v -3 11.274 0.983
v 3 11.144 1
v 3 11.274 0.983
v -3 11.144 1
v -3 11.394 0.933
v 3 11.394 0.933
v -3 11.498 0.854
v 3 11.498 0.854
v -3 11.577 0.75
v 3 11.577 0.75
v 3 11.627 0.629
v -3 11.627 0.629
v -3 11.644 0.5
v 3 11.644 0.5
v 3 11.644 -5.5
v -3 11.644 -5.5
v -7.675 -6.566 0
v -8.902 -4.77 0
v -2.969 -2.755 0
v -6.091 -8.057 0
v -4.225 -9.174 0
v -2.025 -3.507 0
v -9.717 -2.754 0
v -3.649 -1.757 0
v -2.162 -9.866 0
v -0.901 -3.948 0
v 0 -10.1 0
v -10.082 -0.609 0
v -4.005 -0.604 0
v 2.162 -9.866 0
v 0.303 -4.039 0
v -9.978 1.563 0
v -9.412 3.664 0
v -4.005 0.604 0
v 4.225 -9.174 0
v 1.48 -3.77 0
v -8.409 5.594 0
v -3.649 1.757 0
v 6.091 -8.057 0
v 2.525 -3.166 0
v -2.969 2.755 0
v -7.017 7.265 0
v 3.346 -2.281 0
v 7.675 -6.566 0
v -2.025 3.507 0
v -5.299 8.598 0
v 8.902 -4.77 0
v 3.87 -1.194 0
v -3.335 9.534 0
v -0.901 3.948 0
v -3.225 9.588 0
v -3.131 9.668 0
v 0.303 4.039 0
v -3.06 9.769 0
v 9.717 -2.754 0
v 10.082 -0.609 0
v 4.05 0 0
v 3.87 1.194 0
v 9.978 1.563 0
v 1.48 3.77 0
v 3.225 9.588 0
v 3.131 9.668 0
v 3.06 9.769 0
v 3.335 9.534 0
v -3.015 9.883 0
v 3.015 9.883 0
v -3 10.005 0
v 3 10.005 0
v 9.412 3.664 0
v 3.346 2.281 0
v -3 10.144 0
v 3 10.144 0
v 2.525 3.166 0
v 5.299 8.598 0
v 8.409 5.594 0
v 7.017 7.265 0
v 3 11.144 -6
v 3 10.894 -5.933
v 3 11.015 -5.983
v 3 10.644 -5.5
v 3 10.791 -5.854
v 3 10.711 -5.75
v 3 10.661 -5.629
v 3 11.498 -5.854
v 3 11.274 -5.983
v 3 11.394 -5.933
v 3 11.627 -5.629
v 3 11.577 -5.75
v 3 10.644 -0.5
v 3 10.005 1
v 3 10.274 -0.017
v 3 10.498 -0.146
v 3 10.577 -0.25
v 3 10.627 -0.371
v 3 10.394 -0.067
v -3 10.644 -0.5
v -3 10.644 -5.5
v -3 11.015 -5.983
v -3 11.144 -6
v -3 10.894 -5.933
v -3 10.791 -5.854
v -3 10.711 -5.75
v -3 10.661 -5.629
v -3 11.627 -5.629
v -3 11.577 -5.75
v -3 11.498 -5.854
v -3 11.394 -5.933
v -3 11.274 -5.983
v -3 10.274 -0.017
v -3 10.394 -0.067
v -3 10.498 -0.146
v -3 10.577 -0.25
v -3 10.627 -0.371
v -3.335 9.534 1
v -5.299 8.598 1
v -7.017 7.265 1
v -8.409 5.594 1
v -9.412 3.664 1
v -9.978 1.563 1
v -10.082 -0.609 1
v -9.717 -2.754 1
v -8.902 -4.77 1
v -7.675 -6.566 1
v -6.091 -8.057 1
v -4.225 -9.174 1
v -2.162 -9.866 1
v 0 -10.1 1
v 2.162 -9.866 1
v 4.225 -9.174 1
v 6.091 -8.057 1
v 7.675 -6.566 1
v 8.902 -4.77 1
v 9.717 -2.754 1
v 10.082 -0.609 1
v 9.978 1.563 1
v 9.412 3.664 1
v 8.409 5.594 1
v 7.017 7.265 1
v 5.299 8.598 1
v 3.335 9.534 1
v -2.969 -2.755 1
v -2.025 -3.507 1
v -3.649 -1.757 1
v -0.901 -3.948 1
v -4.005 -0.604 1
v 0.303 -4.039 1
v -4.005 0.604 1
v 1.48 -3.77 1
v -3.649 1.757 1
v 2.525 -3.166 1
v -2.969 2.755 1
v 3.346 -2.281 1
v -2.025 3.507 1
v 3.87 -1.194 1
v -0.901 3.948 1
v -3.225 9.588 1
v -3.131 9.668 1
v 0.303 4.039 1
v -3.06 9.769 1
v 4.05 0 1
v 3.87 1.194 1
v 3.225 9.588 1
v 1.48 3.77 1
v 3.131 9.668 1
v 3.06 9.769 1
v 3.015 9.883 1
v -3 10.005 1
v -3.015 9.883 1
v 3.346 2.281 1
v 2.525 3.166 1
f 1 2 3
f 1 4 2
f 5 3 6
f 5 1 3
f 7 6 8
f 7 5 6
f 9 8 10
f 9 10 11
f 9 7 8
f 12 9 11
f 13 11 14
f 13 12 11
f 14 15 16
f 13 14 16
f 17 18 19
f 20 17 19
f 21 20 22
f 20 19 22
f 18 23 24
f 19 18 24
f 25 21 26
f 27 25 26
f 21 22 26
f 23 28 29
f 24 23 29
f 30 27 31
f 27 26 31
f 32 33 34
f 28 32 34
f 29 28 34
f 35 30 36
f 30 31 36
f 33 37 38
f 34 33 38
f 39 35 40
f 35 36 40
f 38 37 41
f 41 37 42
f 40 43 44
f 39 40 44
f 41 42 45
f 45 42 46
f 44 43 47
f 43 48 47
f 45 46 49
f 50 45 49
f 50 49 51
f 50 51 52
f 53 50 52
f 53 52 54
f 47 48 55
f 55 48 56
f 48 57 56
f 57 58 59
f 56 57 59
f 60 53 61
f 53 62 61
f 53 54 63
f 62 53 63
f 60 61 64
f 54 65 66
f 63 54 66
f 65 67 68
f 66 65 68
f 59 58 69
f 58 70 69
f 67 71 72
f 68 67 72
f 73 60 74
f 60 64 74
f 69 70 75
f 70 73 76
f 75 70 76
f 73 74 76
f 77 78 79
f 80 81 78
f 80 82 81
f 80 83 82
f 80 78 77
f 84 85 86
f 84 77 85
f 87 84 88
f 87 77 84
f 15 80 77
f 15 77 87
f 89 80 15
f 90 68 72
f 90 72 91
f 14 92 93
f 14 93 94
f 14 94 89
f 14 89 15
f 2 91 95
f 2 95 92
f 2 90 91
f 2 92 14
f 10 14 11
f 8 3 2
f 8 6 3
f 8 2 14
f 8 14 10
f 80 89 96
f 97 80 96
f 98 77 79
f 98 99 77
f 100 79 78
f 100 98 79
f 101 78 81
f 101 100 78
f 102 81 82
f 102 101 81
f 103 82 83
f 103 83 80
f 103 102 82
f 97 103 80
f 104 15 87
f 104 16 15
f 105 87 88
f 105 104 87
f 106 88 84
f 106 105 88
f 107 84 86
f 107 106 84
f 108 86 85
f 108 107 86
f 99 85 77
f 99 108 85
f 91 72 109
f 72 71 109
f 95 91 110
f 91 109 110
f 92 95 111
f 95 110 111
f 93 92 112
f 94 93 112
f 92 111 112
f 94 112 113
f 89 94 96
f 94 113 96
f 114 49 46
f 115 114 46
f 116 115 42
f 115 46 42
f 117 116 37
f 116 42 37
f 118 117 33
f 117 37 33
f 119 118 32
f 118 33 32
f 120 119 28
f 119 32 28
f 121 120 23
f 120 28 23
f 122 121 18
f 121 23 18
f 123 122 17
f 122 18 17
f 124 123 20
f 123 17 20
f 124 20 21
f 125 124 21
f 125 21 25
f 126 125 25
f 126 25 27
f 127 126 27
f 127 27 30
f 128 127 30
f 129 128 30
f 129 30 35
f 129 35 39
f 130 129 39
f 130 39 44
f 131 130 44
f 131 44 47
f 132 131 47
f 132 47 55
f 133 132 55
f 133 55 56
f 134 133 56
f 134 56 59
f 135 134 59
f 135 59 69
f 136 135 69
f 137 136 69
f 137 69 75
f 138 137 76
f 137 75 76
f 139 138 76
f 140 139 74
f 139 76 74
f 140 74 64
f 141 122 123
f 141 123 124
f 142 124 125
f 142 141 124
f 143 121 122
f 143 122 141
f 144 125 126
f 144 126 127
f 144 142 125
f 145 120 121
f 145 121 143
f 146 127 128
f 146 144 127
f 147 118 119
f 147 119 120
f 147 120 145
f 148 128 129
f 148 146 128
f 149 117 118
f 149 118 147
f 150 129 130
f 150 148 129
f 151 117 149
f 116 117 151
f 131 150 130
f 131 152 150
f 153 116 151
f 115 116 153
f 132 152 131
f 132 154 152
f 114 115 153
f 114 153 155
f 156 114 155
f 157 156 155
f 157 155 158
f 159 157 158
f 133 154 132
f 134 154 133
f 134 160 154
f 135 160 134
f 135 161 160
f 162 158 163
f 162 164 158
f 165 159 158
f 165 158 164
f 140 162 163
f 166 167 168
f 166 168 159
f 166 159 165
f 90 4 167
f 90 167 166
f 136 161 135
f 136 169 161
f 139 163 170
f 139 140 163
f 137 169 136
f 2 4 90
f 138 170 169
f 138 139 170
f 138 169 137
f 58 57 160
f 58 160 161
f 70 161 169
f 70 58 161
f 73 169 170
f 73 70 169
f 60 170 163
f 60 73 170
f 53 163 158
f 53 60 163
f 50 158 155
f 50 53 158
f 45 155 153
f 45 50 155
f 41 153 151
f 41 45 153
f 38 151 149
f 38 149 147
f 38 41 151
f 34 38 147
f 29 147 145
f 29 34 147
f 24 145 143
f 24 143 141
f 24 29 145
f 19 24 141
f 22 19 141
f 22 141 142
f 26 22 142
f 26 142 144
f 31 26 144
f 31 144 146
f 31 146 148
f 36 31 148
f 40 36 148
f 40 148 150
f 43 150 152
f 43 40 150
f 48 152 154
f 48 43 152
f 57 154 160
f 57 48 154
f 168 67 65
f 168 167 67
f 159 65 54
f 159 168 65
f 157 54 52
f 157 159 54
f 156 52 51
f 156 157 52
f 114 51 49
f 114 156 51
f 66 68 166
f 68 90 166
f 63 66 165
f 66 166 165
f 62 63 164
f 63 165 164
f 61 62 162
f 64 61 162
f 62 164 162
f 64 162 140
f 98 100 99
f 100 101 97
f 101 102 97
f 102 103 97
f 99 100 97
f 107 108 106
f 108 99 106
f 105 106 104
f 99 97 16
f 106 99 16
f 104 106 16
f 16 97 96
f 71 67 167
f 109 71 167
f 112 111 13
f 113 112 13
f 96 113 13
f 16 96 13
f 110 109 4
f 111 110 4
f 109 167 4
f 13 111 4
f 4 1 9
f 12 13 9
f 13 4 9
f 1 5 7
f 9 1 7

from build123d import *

# Parameters (mm, degrees)
SZKIC1_R                    = 4.05
DODANIE_WYCI_GNI_CIE3_DEPTH = 1
SZKIC5_W                    = 6
SZKIC5_H                    = 1
DODANIE_WYCI_GNI_CIE5_DEPTH = 6
ZAOKR_GLENIE3_R             = 0.5


with BuildPart() as part:
    # Szkic1 → Dodanie-wyciągnięcie3 (new body)
    with BuildSketch(Plane.XY):
        with BuildLine():
            Line((3, 11.644169223), (-3, 11.644169223))
            Line((-3, 11.644169223), (-3, 9.644169223))
            ThreePointArc((-3, 9.644169223), (0, -10.1), (3, 9.644169223))
            Line((3, 9.644169223), (3, 11.644169223))
        make_face()
        Circle(SZKIC1_R, mode=Mode.SUBTRACT)
    extrude(amount=DODANIE_WYCI_GNI_CIE3_DEPTH)

    # Szkic5 → Dodanie-wyciągnięcie5 (add)
    with BuildSketch(Plane(origin=(0, 0, 0), x_dir=(-1, 0, 0), z_dir=(0, 0, -1))):
        with Locations((0, 11.144169223)):
            Rectangle(SZKIC5_W, SZKIC5_H)
    extrude(amount=DODANIE_WYCI_GNI_CIE5_DEPTH)

    # Zaokrąglenie3
    zaokr_glenie3_edges = [part.edges().sort_by_distance(p)[0] for p in [
        (-3, 9.644169223, 0.5),
        (3, 9.644169223, 0.5),
        (0, 11.644169223, -6),
        (0, 10.644169223, -6),
        (0, 10.644169223, 0),
        (0, 11.644169223, 1),
    ]]
    fillet(zaokr_glenie3_edges, radius=ZAOKR_GLENIE3_R - 0.0001)  # a hair under: the kernel refuses the full size


solid = part.part
